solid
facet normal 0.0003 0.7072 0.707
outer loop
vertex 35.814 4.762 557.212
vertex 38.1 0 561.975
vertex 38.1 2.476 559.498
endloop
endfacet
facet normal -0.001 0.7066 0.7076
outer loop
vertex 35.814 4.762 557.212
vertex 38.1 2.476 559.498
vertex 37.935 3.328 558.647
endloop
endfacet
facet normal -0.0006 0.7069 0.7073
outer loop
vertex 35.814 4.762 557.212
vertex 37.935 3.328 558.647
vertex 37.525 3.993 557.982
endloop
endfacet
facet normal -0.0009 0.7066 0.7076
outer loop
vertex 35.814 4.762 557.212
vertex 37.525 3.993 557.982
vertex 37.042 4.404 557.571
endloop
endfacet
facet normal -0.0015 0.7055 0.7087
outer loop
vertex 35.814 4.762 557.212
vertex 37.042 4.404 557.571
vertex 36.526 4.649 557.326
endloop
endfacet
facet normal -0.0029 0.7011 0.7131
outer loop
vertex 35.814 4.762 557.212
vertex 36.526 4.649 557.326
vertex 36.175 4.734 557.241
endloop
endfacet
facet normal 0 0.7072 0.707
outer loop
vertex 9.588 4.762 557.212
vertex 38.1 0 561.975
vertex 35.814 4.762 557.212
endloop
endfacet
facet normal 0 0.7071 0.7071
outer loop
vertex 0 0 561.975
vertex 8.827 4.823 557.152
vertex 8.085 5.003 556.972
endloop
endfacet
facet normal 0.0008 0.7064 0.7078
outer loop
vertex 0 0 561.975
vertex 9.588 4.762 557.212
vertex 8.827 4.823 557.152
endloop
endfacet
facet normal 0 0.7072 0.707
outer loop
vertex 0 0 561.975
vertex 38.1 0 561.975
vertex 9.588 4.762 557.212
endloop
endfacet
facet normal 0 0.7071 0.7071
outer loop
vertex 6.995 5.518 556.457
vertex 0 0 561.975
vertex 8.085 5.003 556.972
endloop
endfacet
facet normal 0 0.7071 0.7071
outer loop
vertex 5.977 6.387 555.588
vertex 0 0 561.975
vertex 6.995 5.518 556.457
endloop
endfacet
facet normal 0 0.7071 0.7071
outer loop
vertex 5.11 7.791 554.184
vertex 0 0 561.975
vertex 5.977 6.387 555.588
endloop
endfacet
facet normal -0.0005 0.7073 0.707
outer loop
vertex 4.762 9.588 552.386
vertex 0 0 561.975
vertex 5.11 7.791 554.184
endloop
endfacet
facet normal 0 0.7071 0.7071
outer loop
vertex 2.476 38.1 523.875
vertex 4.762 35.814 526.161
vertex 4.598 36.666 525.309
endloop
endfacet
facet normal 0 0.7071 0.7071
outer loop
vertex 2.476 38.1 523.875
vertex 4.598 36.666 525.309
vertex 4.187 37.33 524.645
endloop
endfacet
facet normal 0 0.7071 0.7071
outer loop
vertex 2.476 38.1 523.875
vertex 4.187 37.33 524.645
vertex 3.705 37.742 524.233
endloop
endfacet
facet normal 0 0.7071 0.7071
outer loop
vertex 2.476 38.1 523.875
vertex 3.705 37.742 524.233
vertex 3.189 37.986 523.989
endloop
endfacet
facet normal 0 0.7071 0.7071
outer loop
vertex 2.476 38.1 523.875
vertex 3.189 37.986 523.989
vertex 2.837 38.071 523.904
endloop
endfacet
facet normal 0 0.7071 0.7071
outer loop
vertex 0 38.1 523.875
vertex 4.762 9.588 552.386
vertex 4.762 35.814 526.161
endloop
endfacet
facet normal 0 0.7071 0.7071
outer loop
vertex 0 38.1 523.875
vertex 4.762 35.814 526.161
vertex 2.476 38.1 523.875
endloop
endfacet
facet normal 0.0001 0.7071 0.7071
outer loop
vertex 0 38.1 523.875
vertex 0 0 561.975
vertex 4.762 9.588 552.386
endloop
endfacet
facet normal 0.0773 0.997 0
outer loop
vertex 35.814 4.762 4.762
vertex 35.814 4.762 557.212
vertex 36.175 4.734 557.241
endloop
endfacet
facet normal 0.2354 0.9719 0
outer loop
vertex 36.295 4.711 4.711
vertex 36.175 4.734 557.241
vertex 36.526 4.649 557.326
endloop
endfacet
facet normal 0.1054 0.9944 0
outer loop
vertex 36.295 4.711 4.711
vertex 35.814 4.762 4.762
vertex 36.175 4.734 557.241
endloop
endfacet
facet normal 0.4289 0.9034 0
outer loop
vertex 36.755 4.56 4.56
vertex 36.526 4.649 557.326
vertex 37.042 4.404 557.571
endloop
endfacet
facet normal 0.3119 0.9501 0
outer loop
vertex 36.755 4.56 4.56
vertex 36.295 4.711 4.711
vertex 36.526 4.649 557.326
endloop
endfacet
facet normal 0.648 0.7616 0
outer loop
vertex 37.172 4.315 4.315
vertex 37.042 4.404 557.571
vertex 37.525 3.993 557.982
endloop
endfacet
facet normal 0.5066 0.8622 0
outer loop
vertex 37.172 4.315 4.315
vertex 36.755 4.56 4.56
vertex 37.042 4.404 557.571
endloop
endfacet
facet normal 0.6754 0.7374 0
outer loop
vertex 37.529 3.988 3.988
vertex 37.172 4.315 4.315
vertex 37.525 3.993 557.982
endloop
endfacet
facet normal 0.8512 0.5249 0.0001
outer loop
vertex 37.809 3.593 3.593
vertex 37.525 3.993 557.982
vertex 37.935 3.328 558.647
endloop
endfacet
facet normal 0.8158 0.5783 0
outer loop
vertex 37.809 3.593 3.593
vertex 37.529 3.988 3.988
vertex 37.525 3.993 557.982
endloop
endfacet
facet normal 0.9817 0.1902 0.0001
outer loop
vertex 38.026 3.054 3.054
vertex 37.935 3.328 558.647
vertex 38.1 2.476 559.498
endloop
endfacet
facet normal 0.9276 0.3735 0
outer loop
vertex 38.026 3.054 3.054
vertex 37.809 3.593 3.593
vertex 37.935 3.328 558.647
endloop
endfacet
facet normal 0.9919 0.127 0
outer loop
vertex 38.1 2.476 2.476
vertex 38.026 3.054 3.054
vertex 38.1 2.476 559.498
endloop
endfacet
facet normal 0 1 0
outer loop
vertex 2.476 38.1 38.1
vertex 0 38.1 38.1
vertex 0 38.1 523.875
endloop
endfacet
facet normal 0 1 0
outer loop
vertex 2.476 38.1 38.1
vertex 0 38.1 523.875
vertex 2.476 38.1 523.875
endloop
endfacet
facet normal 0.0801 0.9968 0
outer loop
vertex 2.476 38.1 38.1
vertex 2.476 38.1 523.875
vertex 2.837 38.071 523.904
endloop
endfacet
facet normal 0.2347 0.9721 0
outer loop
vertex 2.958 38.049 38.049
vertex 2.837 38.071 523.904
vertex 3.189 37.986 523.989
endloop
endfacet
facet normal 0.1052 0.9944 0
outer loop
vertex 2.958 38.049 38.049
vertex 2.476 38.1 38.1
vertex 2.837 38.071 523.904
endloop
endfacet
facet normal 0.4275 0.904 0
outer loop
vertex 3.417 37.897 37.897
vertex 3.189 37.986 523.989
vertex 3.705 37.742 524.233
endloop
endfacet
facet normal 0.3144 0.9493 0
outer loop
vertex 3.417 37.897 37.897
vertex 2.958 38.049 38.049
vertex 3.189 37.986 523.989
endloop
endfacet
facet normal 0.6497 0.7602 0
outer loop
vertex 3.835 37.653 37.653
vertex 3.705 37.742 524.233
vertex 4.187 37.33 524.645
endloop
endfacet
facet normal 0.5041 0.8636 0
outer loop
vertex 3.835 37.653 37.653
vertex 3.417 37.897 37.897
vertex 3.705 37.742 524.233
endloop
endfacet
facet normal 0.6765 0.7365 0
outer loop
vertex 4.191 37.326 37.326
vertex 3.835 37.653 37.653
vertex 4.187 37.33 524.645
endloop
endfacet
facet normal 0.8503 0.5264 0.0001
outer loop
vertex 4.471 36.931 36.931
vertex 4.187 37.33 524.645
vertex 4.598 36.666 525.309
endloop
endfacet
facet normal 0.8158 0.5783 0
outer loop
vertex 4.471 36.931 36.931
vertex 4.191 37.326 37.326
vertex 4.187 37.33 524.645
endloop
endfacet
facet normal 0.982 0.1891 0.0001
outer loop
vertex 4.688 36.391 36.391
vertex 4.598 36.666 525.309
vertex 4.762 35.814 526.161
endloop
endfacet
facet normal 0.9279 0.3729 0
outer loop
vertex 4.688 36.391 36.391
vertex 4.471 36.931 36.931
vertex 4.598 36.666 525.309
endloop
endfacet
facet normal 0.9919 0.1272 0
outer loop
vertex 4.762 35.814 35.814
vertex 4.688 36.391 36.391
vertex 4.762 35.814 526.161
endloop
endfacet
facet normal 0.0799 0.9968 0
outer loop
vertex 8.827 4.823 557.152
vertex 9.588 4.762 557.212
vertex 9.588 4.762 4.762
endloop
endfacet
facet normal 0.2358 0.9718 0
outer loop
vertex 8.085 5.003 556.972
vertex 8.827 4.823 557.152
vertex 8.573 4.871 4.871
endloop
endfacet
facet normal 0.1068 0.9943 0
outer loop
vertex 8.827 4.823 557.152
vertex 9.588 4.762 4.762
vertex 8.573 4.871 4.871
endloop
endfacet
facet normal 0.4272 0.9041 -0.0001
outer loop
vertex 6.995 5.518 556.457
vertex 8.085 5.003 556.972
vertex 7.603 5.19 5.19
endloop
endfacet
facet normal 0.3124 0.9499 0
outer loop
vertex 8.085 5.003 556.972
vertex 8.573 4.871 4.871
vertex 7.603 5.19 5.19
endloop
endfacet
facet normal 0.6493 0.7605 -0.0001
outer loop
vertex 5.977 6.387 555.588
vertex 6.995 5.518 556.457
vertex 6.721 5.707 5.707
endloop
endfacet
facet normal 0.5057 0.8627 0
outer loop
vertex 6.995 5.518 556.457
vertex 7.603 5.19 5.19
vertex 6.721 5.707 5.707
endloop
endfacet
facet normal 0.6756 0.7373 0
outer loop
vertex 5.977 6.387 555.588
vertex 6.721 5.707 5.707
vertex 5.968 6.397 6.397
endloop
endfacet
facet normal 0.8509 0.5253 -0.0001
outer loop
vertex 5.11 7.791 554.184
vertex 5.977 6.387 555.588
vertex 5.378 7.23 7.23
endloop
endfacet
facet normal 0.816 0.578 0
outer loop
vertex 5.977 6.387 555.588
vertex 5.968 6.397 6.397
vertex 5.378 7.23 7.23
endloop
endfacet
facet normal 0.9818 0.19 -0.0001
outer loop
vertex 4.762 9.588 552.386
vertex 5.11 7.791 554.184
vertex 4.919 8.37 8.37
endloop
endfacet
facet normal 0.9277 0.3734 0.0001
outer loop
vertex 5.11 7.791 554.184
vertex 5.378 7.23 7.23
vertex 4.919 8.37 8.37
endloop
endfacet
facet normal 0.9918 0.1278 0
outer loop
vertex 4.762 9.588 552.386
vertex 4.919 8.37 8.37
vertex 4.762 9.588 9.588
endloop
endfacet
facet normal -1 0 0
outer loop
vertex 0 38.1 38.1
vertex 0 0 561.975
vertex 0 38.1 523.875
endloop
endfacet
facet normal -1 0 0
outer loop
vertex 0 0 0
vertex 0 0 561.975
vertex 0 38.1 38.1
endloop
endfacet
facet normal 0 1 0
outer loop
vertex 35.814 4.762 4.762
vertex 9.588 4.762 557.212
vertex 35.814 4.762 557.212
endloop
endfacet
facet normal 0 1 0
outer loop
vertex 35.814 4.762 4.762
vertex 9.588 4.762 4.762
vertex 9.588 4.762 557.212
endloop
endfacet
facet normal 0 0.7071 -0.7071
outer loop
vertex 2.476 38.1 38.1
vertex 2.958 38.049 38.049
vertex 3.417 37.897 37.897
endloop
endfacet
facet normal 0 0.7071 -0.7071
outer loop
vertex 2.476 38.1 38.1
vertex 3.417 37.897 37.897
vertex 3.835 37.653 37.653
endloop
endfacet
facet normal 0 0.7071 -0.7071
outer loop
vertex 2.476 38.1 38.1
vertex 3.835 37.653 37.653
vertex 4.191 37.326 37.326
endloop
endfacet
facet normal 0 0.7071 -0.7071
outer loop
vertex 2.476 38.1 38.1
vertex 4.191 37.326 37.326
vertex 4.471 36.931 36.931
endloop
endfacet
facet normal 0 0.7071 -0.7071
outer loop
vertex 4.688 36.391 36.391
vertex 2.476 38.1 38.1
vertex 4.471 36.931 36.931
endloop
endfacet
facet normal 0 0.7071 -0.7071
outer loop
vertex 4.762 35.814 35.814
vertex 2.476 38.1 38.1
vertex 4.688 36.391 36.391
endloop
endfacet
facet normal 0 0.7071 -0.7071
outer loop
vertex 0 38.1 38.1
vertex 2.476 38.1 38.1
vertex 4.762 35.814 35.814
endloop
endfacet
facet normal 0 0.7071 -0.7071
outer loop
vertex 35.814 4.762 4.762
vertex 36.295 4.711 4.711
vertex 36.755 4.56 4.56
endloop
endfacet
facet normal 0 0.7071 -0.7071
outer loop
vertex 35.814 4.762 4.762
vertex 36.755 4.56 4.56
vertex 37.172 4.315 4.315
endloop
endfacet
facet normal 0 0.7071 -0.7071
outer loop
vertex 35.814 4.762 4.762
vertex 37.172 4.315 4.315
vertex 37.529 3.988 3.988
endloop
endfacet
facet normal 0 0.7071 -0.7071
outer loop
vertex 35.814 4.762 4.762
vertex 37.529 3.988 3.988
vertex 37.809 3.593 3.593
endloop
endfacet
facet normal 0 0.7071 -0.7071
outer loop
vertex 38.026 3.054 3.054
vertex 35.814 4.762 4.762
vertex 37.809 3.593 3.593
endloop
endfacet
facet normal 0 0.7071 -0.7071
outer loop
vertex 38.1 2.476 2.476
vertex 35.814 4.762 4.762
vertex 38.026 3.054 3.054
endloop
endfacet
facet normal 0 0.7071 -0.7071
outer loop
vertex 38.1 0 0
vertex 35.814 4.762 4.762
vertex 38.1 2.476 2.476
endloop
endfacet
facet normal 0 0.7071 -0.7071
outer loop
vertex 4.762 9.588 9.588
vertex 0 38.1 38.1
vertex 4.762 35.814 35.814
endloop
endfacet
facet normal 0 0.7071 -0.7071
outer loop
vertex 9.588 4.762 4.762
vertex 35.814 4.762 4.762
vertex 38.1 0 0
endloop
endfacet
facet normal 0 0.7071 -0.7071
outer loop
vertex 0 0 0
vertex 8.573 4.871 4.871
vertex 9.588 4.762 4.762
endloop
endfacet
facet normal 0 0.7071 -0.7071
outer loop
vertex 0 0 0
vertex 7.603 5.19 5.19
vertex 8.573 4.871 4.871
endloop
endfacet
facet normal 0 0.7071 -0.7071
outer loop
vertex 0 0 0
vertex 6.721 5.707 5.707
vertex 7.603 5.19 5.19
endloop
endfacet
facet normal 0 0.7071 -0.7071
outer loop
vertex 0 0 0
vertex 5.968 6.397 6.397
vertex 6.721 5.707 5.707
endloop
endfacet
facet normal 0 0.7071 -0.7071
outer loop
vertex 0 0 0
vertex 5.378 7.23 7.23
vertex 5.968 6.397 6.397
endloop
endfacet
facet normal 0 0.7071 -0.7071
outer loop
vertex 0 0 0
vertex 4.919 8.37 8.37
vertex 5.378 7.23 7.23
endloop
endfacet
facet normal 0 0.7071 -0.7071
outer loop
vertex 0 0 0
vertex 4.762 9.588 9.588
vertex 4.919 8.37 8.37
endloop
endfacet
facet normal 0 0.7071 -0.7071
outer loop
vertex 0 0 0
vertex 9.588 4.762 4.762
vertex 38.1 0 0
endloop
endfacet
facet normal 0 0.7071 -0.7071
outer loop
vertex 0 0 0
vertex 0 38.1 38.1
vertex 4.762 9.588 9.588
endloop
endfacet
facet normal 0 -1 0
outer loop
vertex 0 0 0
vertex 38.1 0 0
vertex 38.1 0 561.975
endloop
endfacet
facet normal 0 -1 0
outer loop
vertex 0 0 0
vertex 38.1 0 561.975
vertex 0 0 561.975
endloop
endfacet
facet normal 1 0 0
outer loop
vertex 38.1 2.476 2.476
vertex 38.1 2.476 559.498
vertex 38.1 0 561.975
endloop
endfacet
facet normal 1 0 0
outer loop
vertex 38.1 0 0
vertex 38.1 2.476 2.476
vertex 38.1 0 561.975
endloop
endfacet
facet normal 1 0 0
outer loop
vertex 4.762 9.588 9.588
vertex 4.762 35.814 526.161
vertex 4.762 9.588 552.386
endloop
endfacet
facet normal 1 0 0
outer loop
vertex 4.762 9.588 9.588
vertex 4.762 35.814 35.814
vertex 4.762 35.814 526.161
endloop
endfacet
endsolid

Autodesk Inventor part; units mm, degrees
ref_plane "Start plane" through (0, 0, 0) normal (0, 0, 1) x (1, 0, 0)
ref_plane "End plane" through (0, 0, 561.975) normal (0, 0, 1) x (1, 0, 0)
sketch "Sketch" plane through (0, 0, 0) normal (0, 0, 1) x (1, 0, 0)
  line L0 (38.1, 0) -> (0, 0)
  line L1 (0, 0) -> (0, 38.1)
  line L2 (0, 38.1) -> (2.4765, 38.1)
  line L3 (4.7625, 35.814) -> (4.7625, 9.5885)
  line L4 (9.5885, 4.7625) -> (35.814, 4.7625)
  line L5 (38.1, 2.4765) -> (38.1, 0)
  line L6 (0, -11.0414) -> (0, 31.5385) construction
  line L7 (-11.0414, 0) -> (31.5385, 0) construction
  arc A0 (4.7625, 9.5885) -> (9.5885, 4.7625) centre (9.5885, 9.5885) ccw
  arc A1 (4.7625, 35.814) -> (2.4765, 38.1) centre (2.4765, 35.814) ccw
  arc A2 (38.1, 2.4765) -> (35.814, 4.7625) centre (35.814, 2.4765) ccw
  line L8 (0, 48.4964) -> (0, -20.9644) construction
  line L9 (-20.9644, 0) -> (48.4964, 0) construction
  point P0 (4.7625, 38.1)
  point P1 (4.7625, 4.7625)
  point P2 (38.1, 4.7625)
  dimension "d0" = 38.1
  dimension "d1" = 38.1
  dimension "d2" = 4.7625
  dimension "d3" = 4.7625
  dimension "d10" = 0
  dimension "d11" = 0
  dimension "d14" = 4.826
  dimension "d15" = 2.286
extrude "Body" add sketch "Sketch" along normal up to surface (561.975 mm away) from surface at 0
sketch "Sketch3" plane through (0, 0, 0) normal (0, 0, 1) x (1, 0, 0)
  line L0 (0, 0) -> (10, 0)
ref_plane "Work Plane3" through (0, 0, 0) normal (0, -1, 0) x (1, 0, 0)
sketch "Sketch4" plane through (0, 0, 0) normal (0, -1, 0) x (1, 0, 0)
  line L0 (-2, 0) -> (12, 0)
  line L1 (-2, 561.975) -> (12, 561.975)
  dimension "d17" = 561.975
ref_plane "Work Plane4" through (19.05, 0, 0) normal (0, 0.7071, -0.7071) x (1, 0, 0)
split "Split1" plane through (19.05, 0, 0) removes the side toward (0, 0.7071, -0.7071)
ref_plane "Work Plane5" through (19.05, 0, 561.975) normal (0, 0.7071, 0.7071) x (1, 0, 0)
split "Split2" plane through (19.05, 0, 561.975) removes the side toward (0, 0.7071, 0.7071)
equation "\"d0\" = G_H"
equation "\"d1\" = G_H"
equation "\"d2\" = G_T"
equation "\"d3\" = G_T"
equation "\"d14\" = G_IR"
equation "\"d15\" = G_ER"
equation "\"d4\" = G_L"
equation "\"G_H\" = 38.1"
equation "\"G_T\" = 4.7625"
equation "\"G_ER\" = 2.286"
equation "\"G_IR\" = 4.826"
equation "\"G_L\" = d17"
equation "\"ex\" = 0"
equation "\"G_OFFSET_START\" = 0"
equation "\"G_OFFSET_END\" = 0"
equation "\"d13\" = G_OFFSET_END + B_L"
equation "\"B_L\" = 561.975"
properties part number "AISC - L 1.5 x 1.5 x 3/16 - 22.125" material "Aluminum 6061-AHC"
